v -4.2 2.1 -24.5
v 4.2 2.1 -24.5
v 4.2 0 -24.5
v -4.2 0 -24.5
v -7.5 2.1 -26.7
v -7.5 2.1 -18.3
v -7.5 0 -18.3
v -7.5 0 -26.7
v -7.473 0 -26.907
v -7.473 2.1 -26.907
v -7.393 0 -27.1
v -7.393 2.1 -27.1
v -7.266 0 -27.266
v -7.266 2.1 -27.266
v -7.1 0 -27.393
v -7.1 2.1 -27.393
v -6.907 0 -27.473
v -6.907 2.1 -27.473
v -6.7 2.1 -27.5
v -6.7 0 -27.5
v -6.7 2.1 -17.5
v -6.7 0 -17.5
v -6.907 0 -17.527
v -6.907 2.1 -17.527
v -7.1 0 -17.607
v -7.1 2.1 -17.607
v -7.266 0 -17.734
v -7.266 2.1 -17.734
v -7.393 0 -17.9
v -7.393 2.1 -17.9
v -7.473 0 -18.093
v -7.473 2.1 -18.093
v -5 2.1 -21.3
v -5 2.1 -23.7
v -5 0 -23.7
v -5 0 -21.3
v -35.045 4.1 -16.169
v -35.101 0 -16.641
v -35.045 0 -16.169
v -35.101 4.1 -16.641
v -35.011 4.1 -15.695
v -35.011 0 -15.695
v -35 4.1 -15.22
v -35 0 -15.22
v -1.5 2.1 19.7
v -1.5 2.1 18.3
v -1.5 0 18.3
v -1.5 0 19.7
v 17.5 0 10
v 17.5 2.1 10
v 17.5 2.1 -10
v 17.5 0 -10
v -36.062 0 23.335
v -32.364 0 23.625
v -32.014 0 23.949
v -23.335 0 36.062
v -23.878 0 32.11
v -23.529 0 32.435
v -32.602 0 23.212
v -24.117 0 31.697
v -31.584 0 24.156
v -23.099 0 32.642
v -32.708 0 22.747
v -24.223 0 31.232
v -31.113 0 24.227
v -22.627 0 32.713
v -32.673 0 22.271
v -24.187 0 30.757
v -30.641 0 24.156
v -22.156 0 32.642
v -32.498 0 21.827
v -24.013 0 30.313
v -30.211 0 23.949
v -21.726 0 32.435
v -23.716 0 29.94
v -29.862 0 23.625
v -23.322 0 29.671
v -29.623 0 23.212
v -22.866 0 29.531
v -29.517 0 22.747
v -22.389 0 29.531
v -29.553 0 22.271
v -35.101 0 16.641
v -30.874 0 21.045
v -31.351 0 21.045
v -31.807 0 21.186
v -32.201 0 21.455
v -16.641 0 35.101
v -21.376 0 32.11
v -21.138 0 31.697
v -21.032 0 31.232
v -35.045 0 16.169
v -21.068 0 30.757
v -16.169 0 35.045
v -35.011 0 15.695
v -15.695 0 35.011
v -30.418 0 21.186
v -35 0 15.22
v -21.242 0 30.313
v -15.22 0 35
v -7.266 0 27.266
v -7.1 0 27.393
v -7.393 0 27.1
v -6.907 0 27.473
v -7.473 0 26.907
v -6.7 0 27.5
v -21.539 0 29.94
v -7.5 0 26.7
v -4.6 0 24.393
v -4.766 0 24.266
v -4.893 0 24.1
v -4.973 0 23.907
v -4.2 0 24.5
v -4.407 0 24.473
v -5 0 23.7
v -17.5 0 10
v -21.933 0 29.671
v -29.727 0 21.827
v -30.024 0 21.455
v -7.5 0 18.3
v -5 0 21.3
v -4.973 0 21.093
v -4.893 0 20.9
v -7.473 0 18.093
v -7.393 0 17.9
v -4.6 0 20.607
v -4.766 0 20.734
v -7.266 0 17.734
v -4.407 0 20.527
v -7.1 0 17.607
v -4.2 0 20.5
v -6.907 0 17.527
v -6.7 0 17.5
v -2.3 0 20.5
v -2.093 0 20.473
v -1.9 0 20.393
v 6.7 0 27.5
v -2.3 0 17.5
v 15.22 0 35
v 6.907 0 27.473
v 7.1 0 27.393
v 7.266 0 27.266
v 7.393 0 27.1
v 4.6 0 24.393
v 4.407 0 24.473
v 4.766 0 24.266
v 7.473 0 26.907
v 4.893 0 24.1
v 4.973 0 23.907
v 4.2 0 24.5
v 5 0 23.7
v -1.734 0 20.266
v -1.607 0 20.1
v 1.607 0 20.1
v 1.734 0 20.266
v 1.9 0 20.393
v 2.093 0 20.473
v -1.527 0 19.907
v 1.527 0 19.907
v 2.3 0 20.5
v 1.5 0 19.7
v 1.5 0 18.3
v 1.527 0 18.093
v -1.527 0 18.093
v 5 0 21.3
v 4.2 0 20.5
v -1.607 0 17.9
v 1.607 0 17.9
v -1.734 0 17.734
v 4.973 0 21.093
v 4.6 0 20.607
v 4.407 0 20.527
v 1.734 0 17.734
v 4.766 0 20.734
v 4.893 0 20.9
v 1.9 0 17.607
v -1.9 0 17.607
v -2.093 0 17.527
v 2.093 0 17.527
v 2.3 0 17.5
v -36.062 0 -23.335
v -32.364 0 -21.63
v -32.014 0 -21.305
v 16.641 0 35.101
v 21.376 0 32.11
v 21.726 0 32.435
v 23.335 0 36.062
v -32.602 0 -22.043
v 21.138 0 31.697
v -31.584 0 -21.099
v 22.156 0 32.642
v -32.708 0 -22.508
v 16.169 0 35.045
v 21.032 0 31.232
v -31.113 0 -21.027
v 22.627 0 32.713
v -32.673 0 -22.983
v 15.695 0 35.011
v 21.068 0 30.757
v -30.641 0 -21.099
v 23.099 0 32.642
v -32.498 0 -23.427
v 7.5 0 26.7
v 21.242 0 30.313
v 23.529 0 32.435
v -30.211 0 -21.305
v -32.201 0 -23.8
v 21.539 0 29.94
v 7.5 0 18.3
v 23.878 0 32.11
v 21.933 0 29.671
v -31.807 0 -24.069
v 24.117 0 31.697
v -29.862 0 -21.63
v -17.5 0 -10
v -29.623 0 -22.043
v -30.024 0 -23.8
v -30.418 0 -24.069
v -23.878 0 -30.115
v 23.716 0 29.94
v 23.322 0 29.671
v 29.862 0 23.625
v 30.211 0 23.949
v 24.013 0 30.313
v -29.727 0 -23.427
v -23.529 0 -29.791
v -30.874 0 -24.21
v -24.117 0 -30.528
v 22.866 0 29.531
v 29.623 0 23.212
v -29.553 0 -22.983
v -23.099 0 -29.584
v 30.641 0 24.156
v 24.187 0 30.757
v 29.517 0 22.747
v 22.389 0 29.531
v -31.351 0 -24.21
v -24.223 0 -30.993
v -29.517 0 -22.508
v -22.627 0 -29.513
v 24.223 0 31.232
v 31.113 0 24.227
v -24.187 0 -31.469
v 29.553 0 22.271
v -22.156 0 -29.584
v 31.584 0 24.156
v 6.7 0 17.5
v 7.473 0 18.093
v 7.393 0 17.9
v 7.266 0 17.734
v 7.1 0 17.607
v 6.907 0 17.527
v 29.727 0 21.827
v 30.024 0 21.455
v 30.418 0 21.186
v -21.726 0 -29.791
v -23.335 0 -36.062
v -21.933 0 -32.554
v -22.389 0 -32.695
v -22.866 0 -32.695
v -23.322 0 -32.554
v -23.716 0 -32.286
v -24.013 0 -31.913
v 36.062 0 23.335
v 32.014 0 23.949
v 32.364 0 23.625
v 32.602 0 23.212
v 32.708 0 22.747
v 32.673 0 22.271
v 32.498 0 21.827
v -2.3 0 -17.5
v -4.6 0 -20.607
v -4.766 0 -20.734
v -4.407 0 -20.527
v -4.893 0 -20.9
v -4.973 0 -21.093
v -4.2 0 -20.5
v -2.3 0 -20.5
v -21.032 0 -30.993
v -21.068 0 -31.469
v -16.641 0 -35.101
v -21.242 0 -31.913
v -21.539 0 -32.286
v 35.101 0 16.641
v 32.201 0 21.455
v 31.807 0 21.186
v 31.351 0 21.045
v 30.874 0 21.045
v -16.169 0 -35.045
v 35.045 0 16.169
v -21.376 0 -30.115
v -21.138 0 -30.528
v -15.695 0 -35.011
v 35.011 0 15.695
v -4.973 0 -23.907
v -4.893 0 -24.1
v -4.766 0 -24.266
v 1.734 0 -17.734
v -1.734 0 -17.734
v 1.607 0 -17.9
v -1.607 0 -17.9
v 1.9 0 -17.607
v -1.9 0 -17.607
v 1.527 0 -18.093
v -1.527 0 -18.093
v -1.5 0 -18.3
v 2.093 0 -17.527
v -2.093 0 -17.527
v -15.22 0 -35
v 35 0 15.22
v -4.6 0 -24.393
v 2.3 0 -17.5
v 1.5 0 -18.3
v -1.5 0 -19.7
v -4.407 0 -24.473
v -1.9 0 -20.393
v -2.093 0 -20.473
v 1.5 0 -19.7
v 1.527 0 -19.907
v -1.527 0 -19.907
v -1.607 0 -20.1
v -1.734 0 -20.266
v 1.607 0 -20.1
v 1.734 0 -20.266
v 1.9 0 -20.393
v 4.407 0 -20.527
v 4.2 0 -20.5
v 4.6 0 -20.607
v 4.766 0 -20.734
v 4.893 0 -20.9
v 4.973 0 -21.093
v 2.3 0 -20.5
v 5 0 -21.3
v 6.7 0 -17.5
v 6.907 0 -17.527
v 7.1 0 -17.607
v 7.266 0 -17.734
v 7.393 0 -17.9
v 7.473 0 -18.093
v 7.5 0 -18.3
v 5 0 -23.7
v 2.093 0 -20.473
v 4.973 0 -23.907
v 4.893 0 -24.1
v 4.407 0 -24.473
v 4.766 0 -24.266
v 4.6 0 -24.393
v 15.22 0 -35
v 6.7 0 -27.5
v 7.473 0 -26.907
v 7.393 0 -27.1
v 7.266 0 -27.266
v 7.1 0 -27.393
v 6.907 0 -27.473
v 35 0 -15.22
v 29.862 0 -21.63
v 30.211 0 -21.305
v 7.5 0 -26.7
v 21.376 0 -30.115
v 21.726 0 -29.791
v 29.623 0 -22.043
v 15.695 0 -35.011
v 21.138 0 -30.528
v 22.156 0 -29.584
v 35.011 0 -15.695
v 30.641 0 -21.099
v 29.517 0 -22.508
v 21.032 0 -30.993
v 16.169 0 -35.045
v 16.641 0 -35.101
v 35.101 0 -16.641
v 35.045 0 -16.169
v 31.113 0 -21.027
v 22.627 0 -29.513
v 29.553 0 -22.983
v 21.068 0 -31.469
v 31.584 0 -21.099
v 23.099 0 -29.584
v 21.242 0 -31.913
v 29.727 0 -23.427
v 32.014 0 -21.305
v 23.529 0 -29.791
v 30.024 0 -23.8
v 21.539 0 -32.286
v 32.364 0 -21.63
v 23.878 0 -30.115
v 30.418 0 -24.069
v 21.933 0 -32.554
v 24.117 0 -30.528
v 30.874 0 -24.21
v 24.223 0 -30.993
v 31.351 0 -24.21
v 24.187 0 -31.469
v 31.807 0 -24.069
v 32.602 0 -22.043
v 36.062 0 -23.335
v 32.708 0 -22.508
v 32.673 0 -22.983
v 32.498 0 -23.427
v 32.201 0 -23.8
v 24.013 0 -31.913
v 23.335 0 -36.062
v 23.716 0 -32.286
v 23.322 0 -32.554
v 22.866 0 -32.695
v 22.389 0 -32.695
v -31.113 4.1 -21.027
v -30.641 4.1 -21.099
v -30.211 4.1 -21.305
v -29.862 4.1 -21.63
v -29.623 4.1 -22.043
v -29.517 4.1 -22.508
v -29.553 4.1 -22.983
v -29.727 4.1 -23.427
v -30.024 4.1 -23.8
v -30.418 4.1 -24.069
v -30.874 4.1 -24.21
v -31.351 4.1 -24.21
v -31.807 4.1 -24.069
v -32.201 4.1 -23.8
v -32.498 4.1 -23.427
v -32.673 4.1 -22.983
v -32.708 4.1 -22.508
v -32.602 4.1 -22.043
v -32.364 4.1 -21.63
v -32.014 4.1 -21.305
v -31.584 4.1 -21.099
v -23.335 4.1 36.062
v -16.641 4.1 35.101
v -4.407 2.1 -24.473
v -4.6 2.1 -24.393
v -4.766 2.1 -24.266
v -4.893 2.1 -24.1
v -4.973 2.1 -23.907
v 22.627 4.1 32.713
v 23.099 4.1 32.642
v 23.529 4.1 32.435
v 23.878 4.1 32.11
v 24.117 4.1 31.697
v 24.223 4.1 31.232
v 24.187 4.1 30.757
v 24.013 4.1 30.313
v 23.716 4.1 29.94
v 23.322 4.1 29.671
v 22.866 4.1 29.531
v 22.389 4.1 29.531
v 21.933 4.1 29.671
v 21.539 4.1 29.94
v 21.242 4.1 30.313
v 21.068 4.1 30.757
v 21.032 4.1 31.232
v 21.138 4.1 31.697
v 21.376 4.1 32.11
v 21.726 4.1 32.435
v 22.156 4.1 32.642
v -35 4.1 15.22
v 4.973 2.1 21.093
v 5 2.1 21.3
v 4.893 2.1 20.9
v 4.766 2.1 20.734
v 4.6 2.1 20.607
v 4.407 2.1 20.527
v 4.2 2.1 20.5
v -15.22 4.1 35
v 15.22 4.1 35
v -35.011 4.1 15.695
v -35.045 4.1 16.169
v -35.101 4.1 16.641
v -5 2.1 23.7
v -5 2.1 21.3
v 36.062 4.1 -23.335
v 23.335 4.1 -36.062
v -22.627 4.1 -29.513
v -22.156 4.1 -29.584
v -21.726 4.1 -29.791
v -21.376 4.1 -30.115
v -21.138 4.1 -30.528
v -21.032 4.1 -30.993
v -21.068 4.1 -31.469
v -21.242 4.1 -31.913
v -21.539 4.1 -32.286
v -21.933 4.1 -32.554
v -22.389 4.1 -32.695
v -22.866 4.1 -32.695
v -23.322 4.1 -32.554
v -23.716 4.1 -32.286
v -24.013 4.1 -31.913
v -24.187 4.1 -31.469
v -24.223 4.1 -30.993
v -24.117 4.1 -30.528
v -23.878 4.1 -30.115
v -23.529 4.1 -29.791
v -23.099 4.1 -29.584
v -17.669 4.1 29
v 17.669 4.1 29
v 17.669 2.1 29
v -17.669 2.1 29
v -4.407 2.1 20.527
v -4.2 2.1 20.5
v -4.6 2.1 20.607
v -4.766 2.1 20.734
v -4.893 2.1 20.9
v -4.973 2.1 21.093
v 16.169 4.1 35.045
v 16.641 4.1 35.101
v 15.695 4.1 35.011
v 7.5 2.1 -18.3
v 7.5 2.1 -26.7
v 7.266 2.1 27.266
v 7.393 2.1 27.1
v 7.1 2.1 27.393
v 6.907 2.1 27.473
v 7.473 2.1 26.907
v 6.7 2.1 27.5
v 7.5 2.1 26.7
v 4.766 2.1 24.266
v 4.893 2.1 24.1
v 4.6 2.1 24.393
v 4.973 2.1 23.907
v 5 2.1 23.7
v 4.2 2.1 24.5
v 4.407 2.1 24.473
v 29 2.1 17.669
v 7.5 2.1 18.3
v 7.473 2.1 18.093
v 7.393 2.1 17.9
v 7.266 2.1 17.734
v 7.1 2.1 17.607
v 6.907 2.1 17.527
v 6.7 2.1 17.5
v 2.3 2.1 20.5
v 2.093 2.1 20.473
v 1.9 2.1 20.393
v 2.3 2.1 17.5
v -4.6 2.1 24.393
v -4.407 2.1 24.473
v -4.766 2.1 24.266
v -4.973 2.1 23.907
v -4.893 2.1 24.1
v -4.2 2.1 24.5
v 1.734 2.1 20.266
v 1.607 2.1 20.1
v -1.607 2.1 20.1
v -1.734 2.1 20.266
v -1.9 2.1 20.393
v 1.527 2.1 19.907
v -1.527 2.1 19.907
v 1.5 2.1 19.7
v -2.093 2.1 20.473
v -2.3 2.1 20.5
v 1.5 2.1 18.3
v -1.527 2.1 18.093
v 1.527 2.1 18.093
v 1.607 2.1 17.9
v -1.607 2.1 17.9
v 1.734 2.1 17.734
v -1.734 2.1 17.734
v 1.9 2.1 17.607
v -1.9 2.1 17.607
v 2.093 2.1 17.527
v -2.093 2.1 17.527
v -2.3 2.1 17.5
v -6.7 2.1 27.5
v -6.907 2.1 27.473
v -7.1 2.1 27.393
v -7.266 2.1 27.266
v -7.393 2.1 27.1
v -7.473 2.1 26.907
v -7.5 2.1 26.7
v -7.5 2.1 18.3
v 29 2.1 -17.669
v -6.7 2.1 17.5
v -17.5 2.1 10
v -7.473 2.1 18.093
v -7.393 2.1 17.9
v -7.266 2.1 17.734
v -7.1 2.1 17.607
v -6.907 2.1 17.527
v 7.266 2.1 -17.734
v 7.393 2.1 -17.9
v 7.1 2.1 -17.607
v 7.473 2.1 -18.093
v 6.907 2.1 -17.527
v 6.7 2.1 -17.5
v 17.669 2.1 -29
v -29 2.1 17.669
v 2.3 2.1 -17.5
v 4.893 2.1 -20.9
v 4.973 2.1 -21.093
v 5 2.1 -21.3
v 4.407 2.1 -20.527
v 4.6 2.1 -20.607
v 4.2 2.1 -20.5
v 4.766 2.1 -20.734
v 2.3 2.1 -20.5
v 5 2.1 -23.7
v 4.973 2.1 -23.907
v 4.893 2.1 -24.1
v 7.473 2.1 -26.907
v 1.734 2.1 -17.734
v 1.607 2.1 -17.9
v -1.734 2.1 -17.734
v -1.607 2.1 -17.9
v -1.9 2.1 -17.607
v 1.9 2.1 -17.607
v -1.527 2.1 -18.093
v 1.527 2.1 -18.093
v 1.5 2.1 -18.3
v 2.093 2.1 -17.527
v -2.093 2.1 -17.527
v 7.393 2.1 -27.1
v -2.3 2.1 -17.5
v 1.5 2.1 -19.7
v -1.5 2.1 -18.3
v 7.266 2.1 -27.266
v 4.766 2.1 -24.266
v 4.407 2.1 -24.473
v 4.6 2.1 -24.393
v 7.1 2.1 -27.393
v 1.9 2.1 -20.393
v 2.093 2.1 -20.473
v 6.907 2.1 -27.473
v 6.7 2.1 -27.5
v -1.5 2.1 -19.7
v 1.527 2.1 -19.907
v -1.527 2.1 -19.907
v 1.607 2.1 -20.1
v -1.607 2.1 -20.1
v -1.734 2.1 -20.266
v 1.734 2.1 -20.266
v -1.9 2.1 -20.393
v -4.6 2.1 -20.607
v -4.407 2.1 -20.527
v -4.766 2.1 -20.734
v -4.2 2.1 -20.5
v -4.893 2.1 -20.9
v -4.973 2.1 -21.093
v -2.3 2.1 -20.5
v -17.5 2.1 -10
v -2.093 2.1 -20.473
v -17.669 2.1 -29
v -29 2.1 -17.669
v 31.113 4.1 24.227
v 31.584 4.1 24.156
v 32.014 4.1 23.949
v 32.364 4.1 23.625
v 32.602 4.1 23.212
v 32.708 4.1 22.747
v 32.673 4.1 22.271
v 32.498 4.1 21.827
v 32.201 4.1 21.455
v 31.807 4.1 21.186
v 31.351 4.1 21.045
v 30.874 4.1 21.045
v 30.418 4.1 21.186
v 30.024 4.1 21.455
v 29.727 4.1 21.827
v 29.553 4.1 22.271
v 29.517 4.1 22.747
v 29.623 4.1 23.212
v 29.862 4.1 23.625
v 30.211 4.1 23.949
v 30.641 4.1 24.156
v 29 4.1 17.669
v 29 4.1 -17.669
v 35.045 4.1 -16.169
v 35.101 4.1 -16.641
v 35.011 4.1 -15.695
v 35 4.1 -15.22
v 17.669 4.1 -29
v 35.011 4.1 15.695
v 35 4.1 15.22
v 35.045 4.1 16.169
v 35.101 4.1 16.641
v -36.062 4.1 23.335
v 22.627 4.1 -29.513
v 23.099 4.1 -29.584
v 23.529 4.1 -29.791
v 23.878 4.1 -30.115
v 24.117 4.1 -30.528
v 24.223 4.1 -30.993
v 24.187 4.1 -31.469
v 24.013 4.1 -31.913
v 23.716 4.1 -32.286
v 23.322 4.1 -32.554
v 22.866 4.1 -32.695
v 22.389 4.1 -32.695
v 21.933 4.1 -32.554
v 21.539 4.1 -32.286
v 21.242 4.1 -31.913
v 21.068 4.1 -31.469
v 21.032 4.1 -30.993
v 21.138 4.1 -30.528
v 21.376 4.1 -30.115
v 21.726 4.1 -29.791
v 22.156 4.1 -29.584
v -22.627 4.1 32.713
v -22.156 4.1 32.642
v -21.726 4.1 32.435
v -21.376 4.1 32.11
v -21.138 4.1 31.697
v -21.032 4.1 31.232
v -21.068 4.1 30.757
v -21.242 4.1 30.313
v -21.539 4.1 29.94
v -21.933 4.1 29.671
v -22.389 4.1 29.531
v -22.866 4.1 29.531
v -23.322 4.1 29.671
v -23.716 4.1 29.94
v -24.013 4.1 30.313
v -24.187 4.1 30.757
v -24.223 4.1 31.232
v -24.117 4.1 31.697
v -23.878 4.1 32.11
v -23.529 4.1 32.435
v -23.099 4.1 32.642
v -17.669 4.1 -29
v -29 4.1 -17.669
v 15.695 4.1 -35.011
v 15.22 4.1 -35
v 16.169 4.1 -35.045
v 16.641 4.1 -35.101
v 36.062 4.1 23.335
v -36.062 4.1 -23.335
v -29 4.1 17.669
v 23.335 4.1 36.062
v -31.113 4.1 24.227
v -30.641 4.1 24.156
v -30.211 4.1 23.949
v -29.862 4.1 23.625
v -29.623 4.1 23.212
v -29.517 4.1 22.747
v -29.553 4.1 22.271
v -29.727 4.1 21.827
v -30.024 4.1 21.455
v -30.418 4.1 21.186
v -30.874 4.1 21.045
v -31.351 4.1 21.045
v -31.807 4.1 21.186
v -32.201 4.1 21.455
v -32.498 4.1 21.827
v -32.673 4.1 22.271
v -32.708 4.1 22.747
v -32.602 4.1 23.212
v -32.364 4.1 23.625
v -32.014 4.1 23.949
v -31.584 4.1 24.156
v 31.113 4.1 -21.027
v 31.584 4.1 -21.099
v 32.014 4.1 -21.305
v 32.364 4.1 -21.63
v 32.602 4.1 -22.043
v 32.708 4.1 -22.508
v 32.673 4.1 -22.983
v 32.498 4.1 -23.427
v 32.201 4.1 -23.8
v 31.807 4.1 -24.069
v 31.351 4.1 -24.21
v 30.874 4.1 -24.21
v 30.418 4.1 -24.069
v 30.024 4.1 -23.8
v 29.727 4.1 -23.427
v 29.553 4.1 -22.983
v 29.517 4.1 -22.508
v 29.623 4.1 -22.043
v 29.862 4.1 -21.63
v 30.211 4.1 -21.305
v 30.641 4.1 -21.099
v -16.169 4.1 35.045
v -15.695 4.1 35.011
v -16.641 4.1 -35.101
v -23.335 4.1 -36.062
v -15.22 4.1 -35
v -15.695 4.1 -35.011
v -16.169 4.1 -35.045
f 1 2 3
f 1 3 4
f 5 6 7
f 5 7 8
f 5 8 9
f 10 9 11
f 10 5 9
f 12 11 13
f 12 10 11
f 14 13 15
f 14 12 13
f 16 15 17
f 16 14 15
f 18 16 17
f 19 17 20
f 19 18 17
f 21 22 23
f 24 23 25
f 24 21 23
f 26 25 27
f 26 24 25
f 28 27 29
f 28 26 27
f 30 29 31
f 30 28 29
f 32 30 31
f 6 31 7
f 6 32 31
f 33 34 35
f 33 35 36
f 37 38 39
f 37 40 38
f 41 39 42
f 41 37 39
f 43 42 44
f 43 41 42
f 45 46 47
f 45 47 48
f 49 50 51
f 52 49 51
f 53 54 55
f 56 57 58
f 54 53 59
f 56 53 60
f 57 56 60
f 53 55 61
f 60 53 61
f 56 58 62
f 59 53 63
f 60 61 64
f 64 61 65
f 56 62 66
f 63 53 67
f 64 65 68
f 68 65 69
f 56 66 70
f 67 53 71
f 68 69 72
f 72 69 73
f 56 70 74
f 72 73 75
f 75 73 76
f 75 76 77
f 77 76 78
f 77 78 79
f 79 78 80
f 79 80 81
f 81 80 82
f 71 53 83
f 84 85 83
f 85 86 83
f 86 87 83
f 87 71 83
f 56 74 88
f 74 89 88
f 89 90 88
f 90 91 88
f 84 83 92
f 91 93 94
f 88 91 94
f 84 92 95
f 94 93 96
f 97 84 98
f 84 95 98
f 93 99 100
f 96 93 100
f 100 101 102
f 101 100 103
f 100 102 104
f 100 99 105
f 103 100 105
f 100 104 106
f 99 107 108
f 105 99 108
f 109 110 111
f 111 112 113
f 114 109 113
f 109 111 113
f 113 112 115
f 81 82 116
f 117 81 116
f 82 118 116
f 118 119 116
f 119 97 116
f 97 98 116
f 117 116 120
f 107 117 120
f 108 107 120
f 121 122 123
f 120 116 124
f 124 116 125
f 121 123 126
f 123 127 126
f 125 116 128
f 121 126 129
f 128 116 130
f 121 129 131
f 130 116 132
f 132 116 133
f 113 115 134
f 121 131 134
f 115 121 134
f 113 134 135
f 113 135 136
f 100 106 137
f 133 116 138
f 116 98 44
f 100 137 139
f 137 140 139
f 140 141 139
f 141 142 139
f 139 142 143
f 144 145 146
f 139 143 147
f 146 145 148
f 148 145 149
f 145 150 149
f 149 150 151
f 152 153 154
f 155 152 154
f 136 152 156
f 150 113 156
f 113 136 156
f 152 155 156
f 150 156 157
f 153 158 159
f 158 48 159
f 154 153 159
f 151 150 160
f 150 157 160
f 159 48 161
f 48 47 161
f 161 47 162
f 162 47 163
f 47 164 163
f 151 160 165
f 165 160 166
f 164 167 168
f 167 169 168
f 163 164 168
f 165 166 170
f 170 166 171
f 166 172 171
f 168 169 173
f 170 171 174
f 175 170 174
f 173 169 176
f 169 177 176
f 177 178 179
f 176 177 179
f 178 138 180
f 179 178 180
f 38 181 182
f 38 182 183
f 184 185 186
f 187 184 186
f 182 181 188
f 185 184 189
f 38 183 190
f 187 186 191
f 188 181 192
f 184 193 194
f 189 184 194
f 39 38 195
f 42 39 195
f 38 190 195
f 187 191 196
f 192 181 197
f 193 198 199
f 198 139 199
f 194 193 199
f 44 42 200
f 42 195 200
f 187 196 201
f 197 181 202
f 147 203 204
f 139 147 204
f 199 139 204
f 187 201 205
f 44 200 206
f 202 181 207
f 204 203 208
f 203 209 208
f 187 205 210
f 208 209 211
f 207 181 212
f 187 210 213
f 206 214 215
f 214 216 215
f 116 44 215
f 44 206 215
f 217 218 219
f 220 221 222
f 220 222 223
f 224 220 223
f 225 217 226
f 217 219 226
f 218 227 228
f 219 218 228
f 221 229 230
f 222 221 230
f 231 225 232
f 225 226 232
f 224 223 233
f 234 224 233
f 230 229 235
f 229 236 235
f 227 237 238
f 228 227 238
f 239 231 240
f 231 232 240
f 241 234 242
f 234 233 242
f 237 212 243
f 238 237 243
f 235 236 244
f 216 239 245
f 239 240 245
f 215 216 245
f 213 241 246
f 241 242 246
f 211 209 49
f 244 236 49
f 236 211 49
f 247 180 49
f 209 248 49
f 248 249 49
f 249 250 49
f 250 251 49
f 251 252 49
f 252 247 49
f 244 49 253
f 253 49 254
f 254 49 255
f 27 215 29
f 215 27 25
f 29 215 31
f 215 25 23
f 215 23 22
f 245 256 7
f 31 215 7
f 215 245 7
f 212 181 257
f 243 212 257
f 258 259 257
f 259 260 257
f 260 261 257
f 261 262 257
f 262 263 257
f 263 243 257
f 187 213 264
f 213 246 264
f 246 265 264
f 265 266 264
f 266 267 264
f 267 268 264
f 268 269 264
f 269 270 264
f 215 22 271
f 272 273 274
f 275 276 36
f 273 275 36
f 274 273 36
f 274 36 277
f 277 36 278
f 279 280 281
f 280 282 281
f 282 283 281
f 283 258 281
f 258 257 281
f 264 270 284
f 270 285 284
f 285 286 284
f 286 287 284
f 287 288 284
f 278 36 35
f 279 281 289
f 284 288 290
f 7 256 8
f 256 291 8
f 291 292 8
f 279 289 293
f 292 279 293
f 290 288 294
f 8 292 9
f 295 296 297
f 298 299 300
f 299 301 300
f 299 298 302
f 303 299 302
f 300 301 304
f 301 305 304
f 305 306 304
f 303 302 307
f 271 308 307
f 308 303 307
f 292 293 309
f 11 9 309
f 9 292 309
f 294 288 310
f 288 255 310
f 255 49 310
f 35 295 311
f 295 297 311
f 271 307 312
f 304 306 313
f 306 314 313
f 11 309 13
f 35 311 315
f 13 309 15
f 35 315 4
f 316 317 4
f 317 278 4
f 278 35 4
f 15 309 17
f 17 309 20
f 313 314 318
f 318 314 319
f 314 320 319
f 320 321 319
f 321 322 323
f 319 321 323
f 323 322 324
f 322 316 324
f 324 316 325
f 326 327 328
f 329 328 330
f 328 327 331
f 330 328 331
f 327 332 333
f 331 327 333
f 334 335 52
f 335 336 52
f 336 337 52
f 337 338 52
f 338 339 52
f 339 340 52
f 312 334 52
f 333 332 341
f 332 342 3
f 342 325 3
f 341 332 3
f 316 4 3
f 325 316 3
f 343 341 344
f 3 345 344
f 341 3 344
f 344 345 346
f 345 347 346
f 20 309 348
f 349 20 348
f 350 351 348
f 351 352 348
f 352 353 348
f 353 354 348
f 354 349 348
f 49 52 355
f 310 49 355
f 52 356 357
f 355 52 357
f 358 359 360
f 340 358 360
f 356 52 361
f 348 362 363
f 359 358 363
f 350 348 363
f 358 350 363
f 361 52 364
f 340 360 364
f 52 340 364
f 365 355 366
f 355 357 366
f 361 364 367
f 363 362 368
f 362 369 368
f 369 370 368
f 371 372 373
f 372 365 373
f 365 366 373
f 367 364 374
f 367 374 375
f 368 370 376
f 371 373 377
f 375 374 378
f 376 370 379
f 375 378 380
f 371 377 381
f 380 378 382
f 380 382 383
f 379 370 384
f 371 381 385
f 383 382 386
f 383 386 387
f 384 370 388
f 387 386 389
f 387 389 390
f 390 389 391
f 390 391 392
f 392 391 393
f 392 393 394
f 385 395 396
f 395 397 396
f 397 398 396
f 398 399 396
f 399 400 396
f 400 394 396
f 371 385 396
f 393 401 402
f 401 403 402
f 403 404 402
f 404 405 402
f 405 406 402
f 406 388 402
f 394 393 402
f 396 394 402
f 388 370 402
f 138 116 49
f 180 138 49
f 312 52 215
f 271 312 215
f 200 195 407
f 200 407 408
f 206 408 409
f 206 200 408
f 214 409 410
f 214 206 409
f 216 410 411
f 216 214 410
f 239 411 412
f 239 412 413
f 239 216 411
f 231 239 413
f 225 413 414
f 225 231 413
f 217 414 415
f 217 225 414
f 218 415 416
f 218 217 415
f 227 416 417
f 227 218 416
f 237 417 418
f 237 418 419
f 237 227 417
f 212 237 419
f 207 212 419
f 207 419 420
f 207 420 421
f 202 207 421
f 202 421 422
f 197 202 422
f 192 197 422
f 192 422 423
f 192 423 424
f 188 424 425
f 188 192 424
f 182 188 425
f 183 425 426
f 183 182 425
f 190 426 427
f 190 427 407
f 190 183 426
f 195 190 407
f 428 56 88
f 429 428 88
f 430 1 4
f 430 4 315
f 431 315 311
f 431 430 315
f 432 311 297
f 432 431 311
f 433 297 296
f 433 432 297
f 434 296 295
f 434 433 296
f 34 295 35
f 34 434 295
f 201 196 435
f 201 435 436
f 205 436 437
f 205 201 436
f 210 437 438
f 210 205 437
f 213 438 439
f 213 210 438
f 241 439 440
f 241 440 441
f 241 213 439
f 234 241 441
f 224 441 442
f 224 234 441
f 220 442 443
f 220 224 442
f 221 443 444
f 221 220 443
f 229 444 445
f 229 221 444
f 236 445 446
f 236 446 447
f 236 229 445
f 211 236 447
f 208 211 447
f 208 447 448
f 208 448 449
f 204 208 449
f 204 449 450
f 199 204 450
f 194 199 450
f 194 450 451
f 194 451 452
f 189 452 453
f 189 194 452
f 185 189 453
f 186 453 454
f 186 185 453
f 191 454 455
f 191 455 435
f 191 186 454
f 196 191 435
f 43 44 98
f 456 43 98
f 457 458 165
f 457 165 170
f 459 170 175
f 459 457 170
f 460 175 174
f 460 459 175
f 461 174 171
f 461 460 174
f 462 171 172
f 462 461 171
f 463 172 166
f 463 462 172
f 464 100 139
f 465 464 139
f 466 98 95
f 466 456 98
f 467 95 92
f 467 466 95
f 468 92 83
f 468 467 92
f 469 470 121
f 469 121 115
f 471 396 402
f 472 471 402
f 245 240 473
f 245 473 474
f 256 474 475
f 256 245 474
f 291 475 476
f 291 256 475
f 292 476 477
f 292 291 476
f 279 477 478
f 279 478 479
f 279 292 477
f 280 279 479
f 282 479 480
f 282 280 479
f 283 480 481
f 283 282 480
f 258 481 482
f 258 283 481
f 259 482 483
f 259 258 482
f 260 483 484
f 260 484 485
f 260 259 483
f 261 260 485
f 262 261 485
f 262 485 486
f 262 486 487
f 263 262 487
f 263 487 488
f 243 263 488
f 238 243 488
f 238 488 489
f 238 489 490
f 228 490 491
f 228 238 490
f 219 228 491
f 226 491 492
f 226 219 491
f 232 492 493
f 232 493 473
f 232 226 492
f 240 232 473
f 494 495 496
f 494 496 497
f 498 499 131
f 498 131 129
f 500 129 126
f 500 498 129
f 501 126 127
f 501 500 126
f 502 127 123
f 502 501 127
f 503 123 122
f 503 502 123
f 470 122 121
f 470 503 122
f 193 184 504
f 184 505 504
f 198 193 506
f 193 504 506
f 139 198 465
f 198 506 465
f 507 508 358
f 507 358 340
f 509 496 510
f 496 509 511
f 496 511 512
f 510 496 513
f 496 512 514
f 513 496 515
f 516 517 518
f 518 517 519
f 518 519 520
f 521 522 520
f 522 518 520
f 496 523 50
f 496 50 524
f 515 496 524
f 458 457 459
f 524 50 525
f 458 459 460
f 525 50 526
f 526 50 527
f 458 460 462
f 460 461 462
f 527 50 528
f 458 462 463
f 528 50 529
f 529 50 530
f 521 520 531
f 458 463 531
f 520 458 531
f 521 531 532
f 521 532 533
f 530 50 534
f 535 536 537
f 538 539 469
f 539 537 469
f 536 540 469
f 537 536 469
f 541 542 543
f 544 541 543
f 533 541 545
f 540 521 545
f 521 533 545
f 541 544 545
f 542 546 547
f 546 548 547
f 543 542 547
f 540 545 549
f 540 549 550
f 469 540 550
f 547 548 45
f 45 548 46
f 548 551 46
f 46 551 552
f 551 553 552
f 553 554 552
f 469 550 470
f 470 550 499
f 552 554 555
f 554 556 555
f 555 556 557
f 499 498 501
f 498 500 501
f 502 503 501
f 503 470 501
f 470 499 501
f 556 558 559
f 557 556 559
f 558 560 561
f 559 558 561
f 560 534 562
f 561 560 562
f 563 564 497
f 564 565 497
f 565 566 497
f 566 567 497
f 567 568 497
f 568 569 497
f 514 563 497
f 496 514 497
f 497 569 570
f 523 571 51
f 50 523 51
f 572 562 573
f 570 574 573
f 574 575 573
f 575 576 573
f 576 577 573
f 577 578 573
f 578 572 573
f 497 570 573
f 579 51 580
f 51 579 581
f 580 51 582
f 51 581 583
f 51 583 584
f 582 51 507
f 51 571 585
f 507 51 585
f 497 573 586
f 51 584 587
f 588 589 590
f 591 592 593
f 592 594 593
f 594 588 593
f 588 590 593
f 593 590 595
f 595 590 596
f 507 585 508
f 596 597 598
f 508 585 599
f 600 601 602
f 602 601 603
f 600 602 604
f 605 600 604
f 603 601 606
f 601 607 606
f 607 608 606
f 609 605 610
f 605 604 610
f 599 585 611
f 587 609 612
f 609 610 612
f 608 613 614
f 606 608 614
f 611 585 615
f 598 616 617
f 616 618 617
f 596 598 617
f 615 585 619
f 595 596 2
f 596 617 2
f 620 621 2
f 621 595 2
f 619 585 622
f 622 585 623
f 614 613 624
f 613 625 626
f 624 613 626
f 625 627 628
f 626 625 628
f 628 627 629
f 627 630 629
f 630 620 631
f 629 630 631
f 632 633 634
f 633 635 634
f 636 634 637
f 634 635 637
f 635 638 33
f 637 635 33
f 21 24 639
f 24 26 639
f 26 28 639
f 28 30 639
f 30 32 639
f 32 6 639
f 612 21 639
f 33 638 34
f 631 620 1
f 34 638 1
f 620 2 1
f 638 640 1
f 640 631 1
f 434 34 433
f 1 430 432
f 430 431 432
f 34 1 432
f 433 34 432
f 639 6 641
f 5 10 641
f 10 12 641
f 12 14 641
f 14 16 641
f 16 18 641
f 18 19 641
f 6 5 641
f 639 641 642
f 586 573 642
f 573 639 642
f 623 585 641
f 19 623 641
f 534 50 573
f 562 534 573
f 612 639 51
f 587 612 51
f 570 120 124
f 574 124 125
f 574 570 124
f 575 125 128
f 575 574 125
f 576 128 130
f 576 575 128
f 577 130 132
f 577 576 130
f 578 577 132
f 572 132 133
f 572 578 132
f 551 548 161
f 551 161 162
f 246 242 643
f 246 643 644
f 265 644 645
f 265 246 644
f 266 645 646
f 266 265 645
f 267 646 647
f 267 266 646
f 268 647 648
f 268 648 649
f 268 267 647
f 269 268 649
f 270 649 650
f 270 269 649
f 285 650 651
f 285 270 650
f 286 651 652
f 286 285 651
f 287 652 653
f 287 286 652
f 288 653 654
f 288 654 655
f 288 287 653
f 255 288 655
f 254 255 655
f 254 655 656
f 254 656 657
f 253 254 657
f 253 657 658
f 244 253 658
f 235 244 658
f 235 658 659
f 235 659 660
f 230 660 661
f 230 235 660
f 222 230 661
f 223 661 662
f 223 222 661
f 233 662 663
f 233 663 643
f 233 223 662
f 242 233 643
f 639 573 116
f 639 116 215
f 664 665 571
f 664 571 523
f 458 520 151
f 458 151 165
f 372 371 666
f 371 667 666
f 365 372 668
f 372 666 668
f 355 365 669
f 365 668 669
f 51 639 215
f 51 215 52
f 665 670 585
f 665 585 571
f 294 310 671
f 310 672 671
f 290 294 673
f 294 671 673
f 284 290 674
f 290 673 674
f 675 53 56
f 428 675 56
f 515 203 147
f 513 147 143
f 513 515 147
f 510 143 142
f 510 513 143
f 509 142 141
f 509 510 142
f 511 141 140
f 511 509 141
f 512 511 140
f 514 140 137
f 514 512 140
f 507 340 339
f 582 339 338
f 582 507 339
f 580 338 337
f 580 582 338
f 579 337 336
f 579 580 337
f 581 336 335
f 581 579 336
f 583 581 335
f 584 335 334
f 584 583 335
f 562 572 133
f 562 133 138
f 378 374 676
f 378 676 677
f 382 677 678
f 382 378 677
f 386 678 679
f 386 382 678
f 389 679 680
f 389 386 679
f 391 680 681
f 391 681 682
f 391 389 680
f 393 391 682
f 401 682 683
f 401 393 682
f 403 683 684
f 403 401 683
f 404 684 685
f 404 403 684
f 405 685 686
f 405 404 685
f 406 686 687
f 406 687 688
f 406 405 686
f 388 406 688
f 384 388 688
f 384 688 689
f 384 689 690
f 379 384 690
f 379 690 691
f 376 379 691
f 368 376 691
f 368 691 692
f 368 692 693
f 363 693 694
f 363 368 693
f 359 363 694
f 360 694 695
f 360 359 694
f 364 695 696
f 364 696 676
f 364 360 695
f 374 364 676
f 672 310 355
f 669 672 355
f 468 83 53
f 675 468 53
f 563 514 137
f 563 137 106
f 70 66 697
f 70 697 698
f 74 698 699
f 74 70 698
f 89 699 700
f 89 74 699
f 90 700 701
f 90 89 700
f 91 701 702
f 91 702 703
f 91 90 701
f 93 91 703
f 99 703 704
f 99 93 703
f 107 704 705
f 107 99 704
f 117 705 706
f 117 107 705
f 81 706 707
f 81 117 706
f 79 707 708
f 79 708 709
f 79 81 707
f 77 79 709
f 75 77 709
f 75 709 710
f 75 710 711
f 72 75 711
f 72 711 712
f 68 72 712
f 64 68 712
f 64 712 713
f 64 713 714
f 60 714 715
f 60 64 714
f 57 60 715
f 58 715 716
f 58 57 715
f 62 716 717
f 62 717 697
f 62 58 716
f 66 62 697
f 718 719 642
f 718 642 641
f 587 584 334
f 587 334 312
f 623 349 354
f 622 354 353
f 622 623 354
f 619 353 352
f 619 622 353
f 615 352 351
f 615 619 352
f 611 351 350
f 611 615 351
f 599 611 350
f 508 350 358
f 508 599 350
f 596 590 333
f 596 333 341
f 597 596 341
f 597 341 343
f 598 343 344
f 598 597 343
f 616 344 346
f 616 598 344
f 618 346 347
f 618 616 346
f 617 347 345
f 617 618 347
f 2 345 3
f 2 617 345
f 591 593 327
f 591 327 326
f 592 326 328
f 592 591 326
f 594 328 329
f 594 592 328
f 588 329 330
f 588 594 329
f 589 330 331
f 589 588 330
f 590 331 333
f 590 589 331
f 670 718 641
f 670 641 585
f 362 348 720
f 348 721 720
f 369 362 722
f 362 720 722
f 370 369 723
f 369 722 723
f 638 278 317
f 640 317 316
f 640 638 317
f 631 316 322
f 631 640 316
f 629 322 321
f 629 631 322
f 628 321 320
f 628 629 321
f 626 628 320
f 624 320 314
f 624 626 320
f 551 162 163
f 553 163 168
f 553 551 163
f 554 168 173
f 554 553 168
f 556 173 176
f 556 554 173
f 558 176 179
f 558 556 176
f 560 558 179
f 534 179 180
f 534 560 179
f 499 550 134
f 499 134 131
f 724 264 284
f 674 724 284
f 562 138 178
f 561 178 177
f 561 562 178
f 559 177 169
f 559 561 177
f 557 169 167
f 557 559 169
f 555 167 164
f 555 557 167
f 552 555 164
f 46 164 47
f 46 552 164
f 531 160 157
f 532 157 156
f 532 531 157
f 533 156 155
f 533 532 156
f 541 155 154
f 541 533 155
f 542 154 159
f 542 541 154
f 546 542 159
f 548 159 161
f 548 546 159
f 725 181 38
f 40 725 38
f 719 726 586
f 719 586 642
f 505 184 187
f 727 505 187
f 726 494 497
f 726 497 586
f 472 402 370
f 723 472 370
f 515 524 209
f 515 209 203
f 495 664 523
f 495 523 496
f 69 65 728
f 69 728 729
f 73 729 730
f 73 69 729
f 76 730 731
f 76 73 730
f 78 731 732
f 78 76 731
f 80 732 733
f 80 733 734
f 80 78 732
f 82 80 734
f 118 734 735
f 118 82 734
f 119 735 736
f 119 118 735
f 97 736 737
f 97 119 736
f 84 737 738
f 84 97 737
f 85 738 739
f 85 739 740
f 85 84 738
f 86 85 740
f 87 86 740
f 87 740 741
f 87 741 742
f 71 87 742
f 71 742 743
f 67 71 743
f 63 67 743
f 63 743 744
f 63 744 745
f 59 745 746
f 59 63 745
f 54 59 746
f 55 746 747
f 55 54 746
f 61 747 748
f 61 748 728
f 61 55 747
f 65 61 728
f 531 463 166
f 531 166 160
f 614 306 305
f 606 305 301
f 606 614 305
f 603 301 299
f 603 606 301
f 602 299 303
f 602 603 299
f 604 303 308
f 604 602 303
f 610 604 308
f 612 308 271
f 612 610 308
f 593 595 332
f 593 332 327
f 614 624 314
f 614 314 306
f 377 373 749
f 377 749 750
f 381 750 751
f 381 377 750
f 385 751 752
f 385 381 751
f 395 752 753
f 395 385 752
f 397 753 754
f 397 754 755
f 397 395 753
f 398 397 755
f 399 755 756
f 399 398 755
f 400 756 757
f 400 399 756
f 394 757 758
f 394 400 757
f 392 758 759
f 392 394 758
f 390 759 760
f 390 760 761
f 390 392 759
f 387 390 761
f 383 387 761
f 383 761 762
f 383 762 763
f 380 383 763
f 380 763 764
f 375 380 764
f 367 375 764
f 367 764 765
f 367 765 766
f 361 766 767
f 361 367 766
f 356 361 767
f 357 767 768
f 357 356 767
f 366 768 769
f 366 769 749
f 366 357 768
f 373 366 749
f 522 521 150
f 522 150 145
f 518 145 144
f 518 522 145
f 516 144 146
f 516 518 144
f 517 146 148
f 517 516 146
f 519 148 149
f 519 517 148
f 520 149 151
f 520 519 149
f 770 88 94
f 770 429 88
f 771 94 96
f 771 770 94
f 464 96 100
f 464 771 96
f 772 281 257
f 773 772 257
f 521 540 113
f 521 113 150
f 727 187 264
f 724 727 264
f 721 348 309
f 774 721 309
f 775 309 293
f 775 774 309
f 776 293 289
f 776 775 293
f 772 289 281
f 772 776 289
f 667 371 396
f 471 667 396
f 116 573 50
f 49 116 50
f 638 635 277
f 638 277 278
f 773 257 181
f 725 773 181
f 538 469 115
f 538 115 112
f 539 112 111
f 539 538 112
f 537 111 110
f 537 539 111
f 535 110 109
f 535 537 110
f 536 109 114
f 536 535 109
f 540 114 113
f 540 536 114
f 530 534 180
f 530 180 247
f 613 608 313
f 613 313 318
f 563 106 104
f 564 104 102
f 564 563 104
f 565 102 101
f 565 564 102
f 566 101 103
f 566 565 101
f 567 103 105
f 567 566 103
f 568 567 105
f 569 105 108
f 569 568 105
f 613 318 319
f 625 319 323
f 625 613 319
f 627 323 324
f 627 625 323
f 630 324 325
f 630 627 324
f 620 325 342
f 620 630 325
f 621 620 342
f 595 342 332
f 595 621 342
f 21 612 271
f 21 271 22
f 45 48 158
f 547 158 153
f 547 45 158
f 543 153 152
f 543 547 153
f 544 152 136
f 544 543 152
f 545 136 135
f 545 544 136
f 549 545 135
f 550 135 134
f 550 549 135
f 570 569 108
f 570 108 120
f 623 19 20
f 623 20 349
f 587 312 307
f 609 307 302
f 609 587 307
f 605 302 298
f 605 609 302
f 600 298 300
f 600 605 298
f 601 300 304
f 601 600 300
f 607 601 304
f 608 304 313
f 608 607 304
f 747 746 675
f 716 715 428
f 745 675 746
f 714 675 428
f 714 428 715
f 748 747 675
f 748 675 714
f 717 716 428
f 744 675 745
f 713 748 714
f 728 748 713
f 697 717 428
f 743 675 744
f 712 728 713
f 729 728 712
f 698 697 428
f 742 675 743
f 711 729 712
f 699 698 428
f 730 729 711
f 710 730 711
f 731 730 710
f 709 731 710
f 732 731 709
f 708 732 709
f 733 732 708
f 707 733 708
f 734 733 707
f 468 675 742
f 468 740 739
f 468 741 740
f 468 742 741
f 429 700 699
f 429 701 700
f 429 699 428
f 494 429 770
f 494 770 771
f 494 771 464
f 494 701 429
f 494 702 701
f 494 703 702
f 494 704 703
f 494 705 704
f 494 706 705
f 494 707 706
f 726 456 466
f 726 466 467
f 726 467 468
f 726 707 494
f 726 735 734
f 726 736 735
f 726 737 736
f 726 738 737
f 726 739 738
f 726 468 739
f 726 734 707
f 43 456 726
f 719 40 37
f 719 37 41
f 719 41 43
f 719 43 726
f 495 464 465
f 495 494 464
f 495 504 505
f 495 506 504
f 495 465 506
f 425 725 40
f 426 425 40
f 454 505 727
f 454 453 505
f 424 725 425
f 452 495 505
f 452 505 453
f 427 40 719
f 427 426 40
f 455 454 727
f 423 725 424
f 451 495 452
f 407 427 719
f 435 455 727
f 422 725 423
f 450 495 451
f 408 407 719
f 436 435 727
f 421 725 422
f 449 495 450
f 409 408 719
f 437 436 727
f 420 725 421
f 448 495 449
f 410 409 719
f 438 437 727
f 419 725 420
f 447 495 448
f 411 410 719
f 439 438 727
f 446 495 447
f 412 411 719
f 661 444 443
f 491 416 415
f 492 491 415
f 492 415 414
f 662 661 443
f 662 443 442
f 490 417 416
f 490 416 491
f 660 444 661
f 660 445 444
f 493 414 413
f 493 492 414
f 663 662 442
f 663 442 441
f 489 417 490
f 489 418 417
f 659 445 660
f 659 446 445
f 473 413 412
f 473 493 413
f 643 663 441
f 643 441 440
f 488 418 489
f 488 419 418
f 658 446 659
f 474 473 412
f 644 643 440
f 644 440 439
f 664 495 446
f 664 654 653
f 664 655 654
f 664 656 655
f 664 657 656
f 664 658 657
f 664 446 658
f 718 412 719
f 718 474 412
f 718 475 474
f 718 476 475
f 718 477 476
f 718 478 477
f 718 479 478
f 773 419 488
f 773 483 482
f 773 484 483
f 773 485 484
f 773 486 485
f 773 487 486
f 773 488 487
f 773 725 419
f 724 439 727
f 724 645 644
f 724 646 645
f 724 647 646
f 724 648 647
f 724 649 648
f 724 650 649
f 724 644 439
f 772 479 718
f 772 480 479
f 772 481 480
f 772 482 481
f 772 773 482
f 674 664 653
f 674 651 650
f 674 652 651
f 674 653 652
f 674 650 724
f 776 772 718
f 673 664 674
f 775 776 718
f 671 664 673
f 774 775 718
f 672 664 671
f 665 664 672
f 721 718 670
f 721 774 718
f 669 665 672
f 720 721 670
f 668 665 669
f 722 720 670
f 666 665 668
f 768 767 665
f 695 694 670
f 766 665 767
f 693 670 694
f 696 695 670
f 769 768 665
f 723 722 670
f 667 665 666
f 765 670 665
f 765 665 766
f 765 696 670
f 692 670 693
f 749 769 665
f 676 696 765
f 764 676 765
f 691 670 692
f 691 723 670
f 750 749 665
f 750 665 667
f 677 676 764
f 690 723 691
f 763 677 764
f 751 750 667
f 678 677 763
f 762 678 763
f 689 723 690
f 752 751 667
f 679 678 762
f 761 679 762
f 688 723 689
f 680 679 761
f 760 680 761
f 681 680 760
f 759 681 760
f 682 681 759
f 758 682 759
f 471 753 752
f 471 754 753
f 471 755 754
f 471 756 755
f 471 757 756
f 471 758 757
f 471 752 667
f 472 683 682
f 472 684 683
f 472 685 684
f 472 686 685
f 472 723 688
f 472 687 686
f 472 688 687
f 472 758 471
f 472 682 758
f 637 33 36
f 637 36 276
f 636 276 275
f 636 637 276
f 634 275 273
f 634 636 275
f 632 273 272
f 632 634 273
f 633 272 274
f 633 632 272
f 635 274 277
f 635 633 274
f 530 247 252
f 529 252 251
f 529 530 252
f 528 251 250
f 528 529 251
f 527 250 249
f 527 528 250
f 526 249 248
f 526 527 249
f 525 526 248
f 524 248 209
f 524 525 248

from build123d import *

# Parameters (mm, degrees)
SKETCH1_R           = 1.6
BOSS_EXTRUDE1_DEPTH = 4.1
CUT_EXTRUDE1_DEPTH  = 2
FILLET2_R           = 10
CUT_EXTRUDE4_DEPTH  = 52.043216983
SKETCH7_W           = 35
SKETCH7_H           = 20
CUT_EXTRUDE5_DEPTH  = 52.043216983


with BuildPart() as part:
    # Sketch1 → Boss-Extrude1 (new body)
    with BuildSketch(Plane(origin=(0, 0, 0), x_dir=(1, 0, 0), z_dir=(0, 1, 0))):
        Polygon((15.934040652, 35), (-15.934040652, 35), (-23.334523779, 36.062445841), (-36.062445841, 23.334523779), (-35, 15.934040652), (-35, -15.934040652), (-36.062445841, -23.334523779), (-23.334523779, -36.062445841), (-15.934040652, -35), (15.934040652, -35), (23.334523779, -36.062445841), (36.062445841, -23.334523779), (35, -15.934040652), (35, 15.934040652), (36.062445841, 23.334523779), (23.334523779, 36.062445841), align=None)
        with Locations((22.627416998, 31.112698372)):
            Circle(SKETCH1_R, mode=Mode.SUBTRACT)
        with Locations((31.112698372, 22.627416998)):
            Circle(SKETCH1_R, mode=Mode.SUBTRACT)
        with Locations((22.627416998, -31.112698372)):
            Circle(SKETCH1_R, mode=Mode.SUBTRACT)
        with Locations((31.112698372, -22.627416998)):
            Circle(SKETCH1_R, mode=Mode.SUBTRACT)
        with Locations((-31.112698372, -22.627416998)):
            Circle(SKETCH1_R, mode=Mode.SUBTRACT)
        with Locations((-22.627416998, -31.112698372)):
            Circle(SKETCH1_R, mode=Mode.SUBTRACT)
        with Locations((-22.627416998, 31.112698372)):
            Circle(SKETCH1_R, mode=Mode.SUBTRACT)
        with Locations((-31.112698372, 22.627416998)):
            Circle(SKETCH1_R, mode=Mode.SUBTRACT)
    extrude(amount=BOSS_EXTRUDE1_DEPTH)

    # Sketch2 → Cut-Extrude1 (cut)
    with BuildSketch(Plane(origin=(0, 4.1, 0), x_dir=(1, 0, 0), z_dir=(0, 1, 0))):
        Polygon((-17.669047558, 29), (17.669047558, 29), (29, 17.669047558), (29, -17.669047558), (17.669047558, -29), (-17.669047558, -29), (-29, -17.669047558), (-29, 17.669047558), align=None)
    extrude(amount=-CUT_EXTRUDE1_DEPTH, mode=Mode.SUBTRACT)

    # Fillet2
    fillet2_edges = [part.edges().sort_by_distance(p)[0] for p in [
        (-15.934040652, 2.05, -35),
        (15.934040652, 2.05, -35),
        (35, 2.05, -15.934040652),
        (35, 2.05, 15.934040652),
        (-35, 2.05, -15.934040652),
        (-35, 2.05, 15.934040652),
        (15.934040652, 2.05, 35),
        (-15.934040652, 2.05, 35),
    ]]
    fillet(fillet2_edges, radius=FILLET2_R)

    # Sketch6 → Cut-Extrude4 (cut, through all)
    with BuildSketch(Plane(origin=(0, 2.1, 0), x_dir=(1, 0, 0), z_dir=(0, 1, 0))):
        with BuildLine():
            Line((-1.5, 19.7), (-1.5, 18.3))
            ThreePointArc((-1.5, 18.3), (-1.734314575, 17.734314575), (-2.3, 17.5))
            Line((-2.3, 17.5), (-6.7, 17.5))
            ThreePointArc((-6.7, 17.5), (-7.265685425, 17.734314575), (-7.5, 18.3))
            Line((-7.5, 18.3), (-7.5, 26.7))
            ThreePointArc((-7.5, 26.7), (-7.265685425, 27.265685425), (-6.7, 27.5))
            Line((-6.7, 27.5), (6.7, 27.5))
            ThreePointArc((6.7, 27.5), (7.265685425, 27.265685425), (7.5, 26.7))
            Line((7.5, 26.7), (7.5, 18.3))
            ThreePointArc((7.5, 18.3), (7.265685425, 17.734314575), (6.7, 17.5))
            Line((6.7, 17.5), (2.3, 17.5))
            ThreePointArc((2.3, 17.5), (1.734314575, 17.734314575), (1.5, 18.3))
            Line((1.5, 18.3), (1.5, 19.7))
            ThreePointArc((1.5, 19.7), (1.734314575, 20.265685425), (2.3, 20.5))
            Line((2.3, 20.5), (4.2, 20.5))
            ThreePointArc((4.2, 20.5), (4.765685425, 20.734314575), (5, 21.3))
            Line((5, 21.3), (5, 23.7))
            ThreePointArc((5, 23.7), (4.765685425, 24.265685425), (4.2, 24.5))
            Line((4.2, 24.5), (-4.2, 24.5))
            ThreePointArc((-4.2, 24.5), (-4.765685425, 24.265685425), (-5, 23.7))
            Line((-5, 23.7), (-5, 21.3))
            ThreePointArc((-5, 21.3), (-4.765685425, 20.734314575), (-4.2, 20.5))
            Line((-4.2, 20.5), (-2.3, 20.5))
            ThreePointArc((-2.3, 20.5), (-1.734314575, 20.265685425), (-1.5, 19.7))
        make_face()
        with BuildLine():
            Line((2.3, -17.5), (6.7, -17.5))
            ThreePointArc((6.7, -17.5), (7.265685425, -17.734314575), (7.5, -18.3))
            Line((7.5, -18.3), (7.5, -26.7))
            ThreePointArc((7.5, -26.7), (7.265685425, -27.265685425), (6.7, -27.5))
            Line((6.7, -27.5), (-6.7, -27.5))
            ThreePointArc((-6.7, -27.5), (-7.265685425, -27.265685425), (-7.5, -26.7))
            Line((-7.5, -26.7), (-7.5, -18.3))
            ThreePointArc((-7.5, -18.3), (-7.265685425, -17.734314575), (-6.7, -17.5))
            Line((-6.7, -17.5), (-2.3, -17.5))
            ThreePointArc((-2.3, -17.5), (-1.734314575, -17.734314575), (-1.5, -18.3))
            Line((-1.5, -18.3), (-1.5, -19.7))
            ThreePointArc((-1.5, -19.7), (-1.734314575, -20.265685425), (-2.3, -20.5))
            Line((-2.3, -20.5), (-4.2, -20.5))
            ThreePointArc((-4.2, -20.5), (-4.765685425, -20.734314575), (-5, -21.3))
            Line((-5, -21.3), (-5, -23.7))
            ThreePointArc((-5, -23.7), (-4.765685425, -24.265685425), (-4.2, -24.5))
            Line((-4.2, -24.5), (4.2, -24.5))
            ThreePointArc((4.2, -24.5), (4.765685425, -24.265685425), (5, -23.7))
            Line((5, -23.7), (5, -21.3))
            ThreePointArc((5, -21.3), (4.765685425, -20.734314575), (4.2, -20.5))
            Line((4.2, -20.5), (2.3, -20.5))
            ThreePointArc((2.3, -20.5), (1.734314575, -20.265685425), (1.5, -19.7))
            Line((1.5, -19.7), (1.5, -18.3))
            ThreePointArc((1.5, -18.3), (1.734314575, -17.734314575), (2.3, -17.5))
        make_face()
    extrude(amount=-CUT_EXTRUDE4_DEPTH, mode=Mode.SUBTRACT)

    # Sketch7 → Cut-Extrude5 (cut, through all)
    with BuildSketch(Plane(origin=(0, 2.1, 0), x_dir=(1, 0, 0), z_dir=(0, 1, 0))):
        Rectangle(SKETCH7_W, SKETCH7_H)
    extrude(amount=-CUT_EXTRUDE5_DEPTH, mode=Mode.SUBTRACT)


solid = part.part
